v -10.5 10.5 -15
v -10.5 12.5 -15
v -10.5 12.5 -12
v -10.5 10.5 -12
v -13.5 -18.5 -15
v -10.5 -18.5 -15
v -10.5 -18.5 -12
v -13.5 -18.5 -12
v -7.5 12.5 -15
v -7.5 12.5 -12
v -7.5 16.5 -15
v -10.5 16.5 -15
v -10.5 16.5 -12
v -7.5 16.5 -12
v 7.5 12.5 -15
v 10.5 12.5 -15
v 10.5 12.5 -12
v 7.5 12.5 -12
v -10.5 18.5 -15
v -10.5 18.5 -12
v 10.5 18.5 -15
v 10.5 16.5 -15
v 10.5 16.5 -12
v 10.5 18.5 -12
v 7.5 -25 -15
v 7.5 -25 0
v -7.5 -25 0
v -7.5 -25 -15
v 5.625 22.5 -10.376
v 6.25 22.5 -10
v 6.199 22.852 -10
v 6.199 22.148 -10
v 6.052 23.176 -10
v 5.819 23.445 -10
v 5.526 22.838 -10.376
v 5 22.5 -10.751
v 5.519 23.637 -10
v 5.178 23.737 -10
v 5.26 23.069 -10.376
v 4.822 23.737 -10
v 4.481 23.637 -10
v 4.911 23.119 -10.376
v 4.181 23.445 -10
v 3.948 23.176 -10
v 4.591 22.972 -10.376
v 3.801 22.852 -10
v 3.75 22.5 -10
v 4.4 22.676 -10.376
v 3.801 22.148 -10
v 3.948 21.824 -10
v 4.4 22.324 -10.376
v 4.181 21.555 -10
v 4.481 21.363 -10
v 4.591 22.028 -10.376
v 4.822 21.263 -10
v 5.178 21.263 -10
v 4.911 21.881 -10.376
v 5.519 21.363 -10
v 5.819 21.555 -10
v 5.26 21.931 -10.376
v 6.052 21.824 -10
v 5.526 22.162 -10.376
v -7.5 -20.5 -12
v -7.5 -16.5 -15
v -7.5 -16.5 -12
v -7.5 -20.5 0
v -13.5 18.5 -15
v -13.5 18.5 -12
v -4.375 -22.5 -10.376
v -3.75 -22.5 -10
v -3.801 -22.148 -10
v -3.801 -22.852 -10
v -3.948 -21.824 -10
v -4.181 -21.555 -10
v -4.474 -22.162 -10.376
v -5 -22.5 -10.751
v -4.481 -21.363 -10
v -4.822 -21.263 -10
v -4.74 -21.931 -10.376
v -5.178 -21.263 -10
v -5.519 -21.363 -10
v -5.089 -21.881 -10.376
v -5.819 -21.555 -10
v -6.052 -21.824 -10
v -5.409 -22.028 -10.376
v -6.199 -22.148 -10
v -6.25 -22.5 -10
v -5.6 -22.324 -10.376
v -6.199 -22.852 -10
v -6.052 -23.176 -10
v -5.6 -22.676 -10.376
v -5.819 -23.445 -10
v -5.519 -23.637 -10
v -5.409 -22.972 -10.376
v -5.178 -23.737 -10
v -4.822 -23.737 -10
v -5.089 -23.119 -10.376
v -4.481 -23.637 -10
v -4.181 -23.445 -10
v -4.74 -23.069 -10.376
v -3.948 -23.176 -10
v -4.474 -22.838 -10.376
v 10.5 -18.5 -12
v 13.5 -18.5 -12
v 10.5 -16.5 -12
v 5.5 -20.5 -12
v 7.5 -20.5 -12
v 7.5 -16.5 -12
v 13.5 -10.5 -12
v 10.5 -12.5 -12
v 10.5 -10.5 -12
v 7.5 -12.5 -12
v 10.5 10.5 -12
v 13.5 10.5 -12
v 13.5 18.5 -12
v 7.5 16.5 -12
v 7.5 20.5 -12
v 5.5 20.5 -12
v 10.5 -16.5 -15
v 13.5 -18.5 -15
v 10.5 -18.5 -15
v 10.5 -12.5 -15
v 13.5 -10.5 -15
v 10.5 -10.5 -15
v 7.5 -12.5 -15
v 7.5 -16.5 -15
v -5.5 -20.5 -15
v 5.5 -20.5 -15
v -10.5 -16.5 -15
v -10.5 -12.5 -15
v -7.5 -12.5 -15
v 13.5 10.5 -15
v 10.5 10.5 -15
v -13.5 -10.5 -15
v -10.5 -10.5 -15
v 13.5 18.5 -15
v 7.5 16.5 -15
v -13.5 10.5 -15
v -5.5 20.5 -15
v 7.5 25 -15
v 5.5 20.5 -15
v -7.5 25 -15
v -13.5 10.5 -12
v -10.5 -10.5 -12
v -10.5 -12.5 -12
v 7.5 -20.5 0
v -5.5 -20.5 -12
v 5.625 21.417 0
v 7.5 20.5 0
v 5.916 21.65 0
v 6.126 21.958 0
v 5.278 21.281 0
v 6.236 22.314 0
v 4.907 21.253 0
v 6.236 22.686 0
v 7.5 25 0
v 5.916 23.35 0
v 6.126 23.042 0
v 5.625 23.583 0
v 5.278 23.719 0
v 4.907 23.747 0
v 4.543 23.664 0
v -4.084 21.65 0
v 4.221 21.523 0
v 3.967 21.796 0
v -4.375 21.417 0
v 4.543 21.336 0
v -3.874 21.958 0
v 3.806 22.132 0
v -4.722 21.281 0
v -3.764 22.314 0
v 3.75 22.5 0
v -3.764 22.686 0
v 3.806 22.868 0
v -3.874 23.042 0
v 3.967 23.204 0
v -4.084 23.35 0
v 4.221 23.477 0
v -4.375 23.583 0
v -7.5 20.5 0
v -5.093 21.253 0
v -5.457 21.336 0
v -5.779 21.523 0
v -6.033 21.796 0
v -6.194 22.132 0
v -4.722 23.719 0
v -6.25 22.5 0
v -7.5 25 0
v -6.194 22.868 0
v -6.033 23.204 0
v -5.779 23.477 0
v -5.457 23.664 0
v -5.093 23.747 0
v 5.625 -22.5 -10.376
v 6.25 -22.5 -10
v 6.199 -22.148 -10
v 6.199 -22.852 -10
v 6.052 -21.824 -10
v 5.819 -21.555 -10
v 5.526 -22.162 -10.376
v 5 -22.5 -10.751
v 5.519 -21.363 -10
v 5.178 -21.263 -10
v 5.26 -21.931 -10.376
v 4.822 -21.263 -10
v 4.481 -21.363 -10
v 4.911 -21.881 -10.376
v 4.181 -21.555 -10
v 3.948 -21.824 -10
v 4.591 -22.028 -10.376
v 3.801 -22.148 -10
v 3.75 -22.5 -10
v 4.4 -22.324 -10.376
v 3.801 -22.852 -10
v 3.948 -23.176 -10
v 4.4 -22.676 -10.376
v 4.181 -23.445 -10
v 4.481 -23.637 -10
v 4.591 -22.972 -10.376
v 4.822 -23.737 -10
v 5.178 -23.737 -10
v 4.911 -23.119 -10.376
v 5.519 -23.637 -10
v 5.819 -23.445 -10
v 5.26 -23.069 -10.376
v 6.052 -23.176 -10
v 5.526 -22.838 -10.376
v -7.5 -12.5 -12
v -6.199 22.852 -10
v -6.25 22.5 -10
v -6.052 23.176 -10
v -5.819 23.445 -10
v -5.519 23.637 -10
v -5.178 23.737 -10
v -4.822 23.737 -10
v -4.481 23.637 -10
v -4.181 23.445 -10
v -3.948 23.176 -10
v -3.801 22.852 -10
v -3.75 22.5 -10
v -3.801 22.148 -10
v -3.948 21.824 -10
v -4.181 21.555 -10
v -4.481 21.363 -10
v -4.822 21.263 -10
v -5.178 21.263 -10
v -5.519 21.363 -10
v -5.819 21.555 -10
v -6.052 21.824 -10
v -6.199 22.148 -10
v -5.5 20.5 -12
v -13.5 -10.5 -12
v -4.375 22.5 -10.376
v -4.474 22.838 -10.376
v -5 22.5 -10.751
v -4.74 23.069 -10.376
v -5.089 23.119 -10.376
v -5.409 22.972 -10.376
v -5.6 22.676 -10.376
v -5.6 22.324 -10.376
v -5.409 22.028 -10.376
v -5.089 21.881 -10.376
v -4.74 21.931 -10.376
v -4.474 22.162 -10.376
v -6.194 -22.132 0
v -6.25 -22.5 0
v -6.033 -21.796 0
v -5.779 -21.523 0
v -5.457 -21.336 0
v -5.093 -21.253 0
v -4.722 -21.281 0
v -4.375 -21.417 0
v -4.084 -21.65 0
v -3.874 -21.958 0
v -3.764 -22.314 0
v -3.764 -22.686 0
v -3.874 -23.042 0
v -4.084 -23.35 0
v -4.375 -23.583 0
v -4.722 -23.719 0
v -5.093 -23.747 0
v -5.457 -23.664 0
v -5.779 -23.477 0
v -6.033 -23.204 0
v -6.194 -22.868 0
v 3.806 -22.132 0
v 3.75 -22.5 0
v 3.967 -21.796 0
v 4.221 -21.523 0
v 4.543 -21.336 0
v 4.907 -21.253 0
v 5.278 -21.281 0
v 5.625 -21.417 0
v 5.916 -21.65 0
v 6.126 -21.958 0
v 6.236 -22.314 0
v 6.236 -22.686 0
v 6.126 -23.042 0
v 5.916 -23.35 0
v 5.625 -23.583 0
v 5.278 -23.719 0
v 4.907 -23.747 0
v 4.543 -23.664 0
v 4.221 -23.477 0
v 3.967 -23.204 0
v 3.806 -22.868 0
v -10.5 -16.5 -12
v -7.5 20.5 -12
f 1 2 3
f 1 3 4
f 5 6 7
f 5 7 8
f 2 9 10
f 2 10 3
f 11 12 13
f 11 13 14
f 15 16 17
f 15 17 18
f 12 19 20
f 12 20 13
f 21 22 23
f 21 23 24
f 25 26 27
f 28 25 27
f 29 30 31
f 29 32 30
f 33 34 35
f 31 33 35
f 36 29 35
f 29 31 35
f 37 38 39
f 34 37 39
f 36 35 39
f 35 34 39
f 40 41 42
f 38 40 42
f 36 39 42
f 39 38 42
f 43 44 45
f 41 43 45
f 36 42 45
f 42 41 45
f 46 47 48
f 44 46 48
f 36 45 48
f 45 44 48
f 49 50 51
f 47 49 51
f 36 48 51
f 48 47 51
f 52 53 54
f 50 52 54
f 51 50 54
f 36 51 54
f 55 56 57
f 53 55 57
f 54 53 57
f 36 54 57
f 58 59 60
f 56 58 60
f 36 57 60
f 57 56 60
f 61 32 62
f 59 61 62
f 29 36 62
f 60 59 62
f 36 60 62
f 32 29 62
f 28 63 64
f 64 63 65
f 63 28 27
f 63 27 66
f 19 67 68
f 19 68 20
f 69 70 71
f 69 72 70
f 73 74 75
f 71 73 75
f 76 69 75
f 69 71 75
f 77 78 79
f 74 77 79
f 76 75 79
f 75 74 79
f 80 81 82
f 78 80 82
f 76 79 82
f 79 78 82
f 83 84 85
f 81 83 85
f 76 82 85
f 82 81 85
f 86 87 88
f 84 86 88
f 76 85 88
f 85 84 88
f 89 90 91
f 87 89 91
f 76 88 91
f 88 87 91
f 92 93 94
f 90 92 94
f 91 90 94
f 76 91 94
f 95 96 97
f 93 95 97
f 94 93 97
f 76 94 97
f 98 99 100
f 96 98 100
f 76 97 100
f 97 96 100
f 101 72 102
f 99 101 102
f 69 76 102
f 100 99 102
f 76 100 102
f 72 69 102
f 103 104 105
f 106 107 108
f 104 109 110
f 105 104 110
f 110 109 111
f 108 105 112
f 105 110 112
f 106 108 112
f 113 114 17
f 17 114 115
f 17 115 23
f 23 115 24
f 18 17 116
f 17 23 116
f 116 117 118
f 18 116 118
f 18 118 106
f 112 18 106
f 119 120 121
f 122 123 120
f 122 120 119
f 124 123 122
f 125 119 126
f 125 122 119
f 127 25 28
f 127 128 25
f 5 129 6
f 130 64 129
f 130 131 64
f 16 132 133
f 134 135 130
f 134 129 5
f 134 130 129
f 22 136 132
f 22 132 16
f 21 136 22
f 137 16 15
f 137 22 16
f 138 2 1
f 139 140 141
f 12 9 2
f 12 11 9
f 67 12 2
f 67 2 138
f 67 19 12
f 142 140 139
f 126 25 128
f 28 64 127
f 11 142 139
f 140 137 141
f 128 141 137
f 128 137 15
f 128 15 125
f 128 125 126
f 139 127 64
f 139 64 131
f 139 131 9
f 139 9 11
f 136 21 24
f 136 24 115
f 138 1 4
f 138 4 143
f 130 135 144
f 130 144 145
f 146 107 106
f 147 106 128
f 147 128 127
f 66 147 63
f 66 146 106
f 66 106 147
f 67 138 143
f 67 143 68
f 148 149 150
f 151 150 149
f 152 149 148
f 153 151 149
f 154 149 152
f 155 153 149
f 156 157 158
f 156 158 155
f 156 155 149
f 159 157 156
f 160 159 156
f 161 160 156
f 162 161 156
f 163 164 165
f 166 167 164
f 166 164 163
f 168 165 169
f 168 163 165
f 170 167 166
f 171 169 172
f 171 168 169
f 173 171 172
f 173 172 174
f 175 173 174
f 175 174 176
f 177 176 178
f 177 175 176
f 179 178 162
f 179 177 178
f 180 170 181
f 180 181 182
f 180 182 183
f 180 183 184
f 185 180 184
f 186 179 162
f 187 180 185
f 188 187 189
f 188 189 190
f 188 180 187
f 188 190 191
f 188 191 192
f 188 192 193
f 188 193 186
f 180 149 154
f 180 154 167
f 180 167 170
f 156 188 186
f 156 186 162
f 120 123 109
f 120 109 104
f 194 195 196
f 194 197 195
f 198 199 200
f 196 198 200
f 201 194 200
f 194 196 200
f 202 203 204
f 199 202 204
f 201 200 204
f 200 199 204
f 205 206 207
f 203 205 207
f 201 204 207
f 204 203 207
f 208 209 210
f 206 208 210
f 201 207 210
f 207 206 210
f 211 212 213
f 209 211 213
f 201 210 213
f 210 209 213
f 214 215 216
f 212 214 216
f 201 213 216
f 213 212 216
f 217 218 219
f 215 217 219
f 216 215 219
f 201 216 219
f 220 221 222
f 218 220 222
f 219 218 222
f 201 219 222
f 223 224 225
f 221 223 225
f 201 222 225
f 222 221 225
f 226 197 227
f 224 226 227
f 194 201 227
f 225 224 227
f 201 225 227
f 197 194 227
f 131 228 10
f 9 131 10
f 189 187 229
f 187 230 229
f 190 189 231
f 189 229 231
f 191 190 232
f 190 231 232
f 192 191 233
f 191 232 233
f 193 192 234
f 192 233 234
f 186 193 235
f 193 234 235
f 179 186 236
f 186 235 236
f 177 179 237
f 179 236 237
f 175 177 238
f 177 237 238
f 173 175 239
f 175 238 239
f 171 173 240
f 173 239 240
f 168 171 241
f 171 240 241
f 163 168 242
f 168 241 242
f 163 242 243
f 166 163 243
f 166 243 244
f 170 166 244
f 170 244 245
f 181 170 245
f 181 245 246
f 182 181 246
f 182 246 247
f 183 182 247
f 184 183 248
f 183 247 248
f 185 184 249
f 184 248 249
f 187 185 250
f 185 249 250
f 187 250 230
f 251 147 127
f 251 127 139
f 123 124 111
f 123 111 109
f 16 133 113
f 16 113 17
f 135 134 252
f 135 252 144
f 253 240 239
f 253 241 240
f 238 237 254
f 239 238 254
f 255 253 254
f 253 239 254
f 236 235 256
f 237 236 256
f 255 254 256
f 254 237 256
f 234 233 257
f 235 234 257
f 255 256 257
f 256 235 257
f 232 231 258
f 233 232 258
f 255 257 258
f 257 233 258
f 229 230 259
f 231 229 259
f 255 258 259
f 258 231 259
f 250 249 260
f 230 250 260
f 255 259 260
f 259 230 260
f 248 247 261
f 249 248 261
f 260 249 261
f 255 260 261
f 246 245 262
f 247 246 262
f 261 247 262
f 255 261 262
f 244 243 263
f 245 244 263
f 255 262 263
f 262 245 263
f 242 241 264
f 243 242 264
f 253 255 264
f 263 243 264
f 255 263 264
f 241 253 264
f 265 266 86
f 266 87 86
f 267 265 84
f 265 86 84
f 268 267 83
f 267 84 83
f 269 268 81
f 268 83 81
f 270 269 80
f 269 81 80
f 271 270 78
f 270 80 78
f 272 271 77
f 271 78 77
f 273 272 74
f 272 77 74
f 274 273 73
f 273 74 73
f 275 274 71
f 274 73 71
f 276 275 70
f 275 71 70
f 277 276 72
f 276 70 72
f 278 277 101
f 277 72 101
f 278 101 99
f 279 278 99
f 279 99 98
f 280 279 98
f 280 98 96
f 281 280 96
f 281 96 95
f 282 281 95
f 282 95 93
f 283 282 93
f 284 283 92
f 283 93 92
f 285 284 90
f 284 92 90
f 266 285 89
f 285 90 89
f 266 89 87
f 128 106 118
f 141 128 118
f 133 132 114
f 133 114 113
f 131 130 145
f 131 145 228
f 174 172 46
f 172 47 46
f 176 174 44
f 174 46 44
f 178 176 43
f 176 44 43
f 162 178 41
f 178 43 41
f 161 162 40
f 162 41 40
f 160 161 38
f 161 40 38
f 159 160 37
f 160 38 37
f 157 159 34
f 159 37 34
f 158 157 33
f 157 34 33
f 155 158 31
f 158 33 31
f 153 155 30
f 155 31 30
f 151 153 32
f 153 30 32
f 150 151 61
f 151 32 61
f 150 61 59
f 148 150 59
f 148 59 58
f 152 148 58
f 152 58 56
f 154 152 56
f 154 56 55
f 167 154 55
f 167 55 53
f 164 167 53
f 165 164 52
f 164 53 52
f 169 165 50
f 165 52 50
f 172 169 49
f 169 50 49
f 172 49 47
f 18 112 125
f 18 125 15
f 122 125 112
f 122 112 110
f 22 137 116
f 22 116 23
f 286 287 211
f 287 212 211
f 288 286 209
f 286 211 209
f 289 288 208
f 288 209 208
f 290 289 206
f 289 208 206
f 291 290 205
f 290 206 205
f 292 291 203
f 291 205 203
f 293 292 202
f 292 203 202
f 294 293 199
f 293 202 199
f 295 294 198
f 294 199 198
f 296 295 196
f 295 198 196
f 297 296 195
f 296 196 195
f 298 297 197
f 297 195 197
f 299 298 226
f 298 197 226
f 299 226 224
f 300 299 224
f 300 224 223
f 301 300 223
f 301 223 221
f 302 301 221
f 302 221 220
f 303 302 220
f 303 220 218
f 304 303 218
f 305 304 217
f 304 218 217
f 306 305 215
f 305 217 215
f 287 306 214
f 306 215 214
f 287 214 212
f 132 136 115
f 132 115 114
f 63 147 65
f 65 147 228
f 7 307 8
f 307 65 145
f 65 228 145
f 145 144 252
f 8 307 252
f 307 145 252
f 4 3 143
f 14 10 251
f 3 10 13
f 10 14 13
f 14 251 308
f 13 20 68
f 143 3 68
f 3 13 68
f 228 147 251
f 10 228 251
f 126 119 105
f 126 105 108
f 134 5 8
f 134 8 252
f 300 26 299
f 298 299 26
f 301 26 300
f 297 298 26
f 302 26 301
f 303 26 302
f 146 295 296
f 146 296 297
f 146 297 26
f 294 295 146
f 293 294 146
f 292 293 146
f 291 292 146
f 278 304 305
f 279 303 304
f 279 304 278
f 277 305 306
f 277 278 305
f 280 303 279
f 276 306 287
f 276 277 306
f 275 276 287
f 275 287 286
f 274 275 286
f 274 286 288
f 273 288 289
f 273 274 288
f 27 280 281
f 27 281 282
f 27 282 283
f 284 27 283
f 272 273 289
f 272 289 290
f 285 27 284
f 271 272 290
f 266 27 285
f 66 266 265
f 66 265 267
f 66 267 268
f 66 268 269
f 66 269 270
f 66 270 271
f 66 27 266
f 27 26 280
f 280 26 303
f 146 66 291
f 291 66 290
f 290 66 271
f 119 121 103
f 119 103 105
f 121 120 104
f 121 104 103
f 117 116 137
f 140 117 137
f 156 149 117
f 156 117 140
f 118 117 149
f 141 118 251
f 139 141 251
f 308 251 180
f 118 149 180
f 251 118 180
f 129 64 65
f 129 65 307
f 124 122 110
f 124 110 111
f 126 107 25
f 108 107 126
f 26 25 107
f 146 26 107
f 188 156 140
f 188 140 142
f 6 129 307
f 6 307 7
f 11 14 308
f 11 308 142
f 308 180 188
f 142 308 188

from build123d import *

# Parameters (mm, degrees)
SKETCH_1_W             = 15
SKETCH_1_H             = 50
EXTRUDE_1_DEPTH        = 3
SKETCH_2_W             = 15
SKETCH_2_H             = 4.5
EXTRUDE_2_DEPTH        = 12
SKETCH_3_W             = 15
SKETCH_3_H             = 50
SKETCH_3_W_2           = 11
SKETCH_3_H_2           = 41
EXTRUDE_3_DEPTH        = 3
EXTRUDE_4_DEPTH        = 3
HOLE_WIZARD_M3_1_D     = 2.5
HOLE_WIZARD_M3_1_DEPTH = 3
CUT_EXTRUDE_1_REACH    = 23
SKETCH_8_W             = 3
SKETCH_8_H             = 50
HOLE_WIZARD_M3_2_D     = 2.5
HOLE_WIZARD_M3_2_DEPTH = 10
HOLE_WIZARD_M3_2_TIP   = 0.751075774


with BuildPart() as part:
    # 스케치1 → 보스-돌출1 (new body)
    with BuildSketch(Plane.XY):
        Rectangle(SKETCH_1_W, SKETCH_1_H)
    extrude(amount=EXTRUDE_1_DEPTH)

    # 스케치2 → 보스-돌출2 (add)
    with BuildSketch(Plane(origin=(0, 0, 0), x_dir=(-1, 0, 0), z_dir=(0, 0, -1))):
        with Locations((0, 22.75)):
            Rectangle(SKETCH_2_W, SKETCH_2_H)
        with Locations((0, -22.75)):
            Rectangle(SKETCH_2_W, SKETCH_2_H)
    extrude(amount=EXTRUDE_2_DEPTH)

    # 스케치3 → 보스-돌출3 (add)
    with BuildSketch(Plane(origin=(0, 0, -12), x_dir=(-1, 0, 0), z_dir=(0, 0, -1))):
        Rectangle(SKETCH_3_W, SKETCH_3_H)
        Rectangle(SKETCH_3_W_2, SKETCH_3_H_2, mode=Mode.SUBTRACT)
    extrude(amount=EXTRUDE_3_DEPTH)

    # 스케치5 → 보스-돌출4 (add)
    with BuildSketch(Plane(origin=(0, 0, -15), x_dir=(-1, 0, 0), z_dir=(0, 0, -1))):
        Polygon((-7.5, 16.5), (-10.5, 16.5), (-10.5, 18.5), (-13.5, 18.5), (-13.5, 10.5), (-10.5, 10.5), (-10.5, 12.5), (-7.5, 12.5), align=None)
        Polygon((7.5, 16.5), (7.5, 12.5), (10.5, 12.5), (10.5, 10.5), (13.5, 10.5), (13.5, 18.5), (10.5, 18.5), (10.5, 16.5), align=None)
        Polygon((7.5, -16.5), (10.5, -16.5), (10.5, -18.5), (13.5, -18.5), (13.5, -10.5), (10.5, -10.5), (10.5, -12.5), (7.5, -12.5), align=None)
        Polygon((-7.5, -16.5), (-7.5, -12.5), (-10.5, -12.5), (-10.5, -10.5), (-13.5, -10.5), (-13.5, -18.5), (-10.5, -18.5), (-10.5, -16.5), align=None)
    extrude(amount=-EXTRUDE_4_DEPTH)

    # M3 나사 구멍1
    with Locations(Plane.XY.offset(3)):
        with Locations((0, 5), (0, -5)):
            Hole(HOLE_WIZARD_M3_1_D / 2, depth=HOLE_WIZARD_M3_1_DEPTH)

    # 스케치8 → 컷-돌출1 (cut, up to next)
    with BuildSketch(Plane.ZY.offset(7.5), mode=Mode.PRIVATE) as cut_extrude_1_sk1:
        with Locations((1.5, 0)):
            Rectangle(SKETCH_8_W, SKETCH_8_H)
    cut_extrude_1_tool1 = extrude(cut_extrude_1_sk1.sketch, amount=-CUT_EXTRUDE_1_REACH, mode=Mode.PRIVATE) & part.part
    add(cut_extrude_1_tool1.solids().sort_by_distance((-7.5, 0, 1.5))[0], mode=Mode.SUBTRACT)

    # M3 나사 구멍2
    with Locations(Plane.XY):
        with Locations((-5, 22.5), (5, 22.5), (-5, -22.5), (5, -22.5)):
            Hole(HOLE_WIZARD_M3_2_D / 2, depth=HOLE_WIZARD_M3_2_DEPTH)
            with Locations((0, 0, -(HOLE_WIZARD_M3_2_DEPTH + HOLE_WIZARD_M3_2_TIP / 2))):  # 118° drill point
                Cone(0, HOLE_WIZARD_M3_2_D / 2, HOLE_WIZARD_M3_2_TIP, mode=Mode.SUBTRACT)


solid = part.part
